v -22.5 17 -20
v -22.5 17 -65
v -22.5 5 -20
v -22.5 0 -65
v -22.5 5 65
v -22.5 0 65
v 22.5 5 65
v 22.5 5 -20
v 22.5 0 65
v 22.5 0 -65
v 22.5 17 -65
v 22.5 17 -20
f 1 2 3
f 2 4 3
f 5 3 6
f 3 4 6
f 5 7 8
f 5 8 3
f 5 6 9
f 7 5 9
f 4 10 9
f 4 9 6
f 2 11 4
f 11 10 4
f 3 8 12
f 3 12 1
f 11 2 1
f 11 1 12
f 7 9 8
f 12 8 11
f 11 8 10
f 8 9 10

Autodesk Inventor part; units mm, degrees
ref_plane "YZ Plane" through (0, 0, 0) normal (1, 0, 0) x (0, 1, 0)
ref_plane "XZ Plane" through (0, 0, 0) normal (0, 1, 0) x (-1, 0, 0)
ref_plane "XY Plane" through (0, 0, 0) normal (0, 0, 1) x (1, 0, 0)
sketch "Sketch1" plane through (0, 0, 0) normal (0, 1, 0) x (-1, 0, 0)
  line L0 (22.5, 65) -> (-22.5, 65)
  line L1 (-22.5, 65) -> (-22.5, -65)
  line L2 (-22.5, -65) -> (22.5, -65)
  line L3 (22.5, -65) -> (22.5, 65)
  line L4 (22.5, 65) -> (-22.5, -65) construction
  line L5 (-22.5, 65) -> (22.5, -65) construction
  point P0 (0, 0)
  dimension "d0" = 45
  dimension "d1" = 130
extrude "Extrusion1" add sketch "Sketch1" along normal blind 5
sketch "Sketch2" plane through (0, 5, 0) normal (0, 1, 0) x (1, 0, 0)
  line L0 (22.5, 65) -> (-22.5, 65) projected
  line L1 (22.5, -65) -> (22.5, 65) projected
  line L2 (-22.5, 65) -> (22.5, 65)
  line L3 (22.5, 65) -> (22.5, 20)
  line L4 (22.5, 20) -> (-22.5, 20)
  line L5 (-22.5, 20) -> (-22.5, 65)
  point P0 (0, 0)
  dimension "d4" = 45
extrude "Extrusion2" add sketch "Sketch2" along normal blind 12
properties part number "linear_motor_base_upper"
